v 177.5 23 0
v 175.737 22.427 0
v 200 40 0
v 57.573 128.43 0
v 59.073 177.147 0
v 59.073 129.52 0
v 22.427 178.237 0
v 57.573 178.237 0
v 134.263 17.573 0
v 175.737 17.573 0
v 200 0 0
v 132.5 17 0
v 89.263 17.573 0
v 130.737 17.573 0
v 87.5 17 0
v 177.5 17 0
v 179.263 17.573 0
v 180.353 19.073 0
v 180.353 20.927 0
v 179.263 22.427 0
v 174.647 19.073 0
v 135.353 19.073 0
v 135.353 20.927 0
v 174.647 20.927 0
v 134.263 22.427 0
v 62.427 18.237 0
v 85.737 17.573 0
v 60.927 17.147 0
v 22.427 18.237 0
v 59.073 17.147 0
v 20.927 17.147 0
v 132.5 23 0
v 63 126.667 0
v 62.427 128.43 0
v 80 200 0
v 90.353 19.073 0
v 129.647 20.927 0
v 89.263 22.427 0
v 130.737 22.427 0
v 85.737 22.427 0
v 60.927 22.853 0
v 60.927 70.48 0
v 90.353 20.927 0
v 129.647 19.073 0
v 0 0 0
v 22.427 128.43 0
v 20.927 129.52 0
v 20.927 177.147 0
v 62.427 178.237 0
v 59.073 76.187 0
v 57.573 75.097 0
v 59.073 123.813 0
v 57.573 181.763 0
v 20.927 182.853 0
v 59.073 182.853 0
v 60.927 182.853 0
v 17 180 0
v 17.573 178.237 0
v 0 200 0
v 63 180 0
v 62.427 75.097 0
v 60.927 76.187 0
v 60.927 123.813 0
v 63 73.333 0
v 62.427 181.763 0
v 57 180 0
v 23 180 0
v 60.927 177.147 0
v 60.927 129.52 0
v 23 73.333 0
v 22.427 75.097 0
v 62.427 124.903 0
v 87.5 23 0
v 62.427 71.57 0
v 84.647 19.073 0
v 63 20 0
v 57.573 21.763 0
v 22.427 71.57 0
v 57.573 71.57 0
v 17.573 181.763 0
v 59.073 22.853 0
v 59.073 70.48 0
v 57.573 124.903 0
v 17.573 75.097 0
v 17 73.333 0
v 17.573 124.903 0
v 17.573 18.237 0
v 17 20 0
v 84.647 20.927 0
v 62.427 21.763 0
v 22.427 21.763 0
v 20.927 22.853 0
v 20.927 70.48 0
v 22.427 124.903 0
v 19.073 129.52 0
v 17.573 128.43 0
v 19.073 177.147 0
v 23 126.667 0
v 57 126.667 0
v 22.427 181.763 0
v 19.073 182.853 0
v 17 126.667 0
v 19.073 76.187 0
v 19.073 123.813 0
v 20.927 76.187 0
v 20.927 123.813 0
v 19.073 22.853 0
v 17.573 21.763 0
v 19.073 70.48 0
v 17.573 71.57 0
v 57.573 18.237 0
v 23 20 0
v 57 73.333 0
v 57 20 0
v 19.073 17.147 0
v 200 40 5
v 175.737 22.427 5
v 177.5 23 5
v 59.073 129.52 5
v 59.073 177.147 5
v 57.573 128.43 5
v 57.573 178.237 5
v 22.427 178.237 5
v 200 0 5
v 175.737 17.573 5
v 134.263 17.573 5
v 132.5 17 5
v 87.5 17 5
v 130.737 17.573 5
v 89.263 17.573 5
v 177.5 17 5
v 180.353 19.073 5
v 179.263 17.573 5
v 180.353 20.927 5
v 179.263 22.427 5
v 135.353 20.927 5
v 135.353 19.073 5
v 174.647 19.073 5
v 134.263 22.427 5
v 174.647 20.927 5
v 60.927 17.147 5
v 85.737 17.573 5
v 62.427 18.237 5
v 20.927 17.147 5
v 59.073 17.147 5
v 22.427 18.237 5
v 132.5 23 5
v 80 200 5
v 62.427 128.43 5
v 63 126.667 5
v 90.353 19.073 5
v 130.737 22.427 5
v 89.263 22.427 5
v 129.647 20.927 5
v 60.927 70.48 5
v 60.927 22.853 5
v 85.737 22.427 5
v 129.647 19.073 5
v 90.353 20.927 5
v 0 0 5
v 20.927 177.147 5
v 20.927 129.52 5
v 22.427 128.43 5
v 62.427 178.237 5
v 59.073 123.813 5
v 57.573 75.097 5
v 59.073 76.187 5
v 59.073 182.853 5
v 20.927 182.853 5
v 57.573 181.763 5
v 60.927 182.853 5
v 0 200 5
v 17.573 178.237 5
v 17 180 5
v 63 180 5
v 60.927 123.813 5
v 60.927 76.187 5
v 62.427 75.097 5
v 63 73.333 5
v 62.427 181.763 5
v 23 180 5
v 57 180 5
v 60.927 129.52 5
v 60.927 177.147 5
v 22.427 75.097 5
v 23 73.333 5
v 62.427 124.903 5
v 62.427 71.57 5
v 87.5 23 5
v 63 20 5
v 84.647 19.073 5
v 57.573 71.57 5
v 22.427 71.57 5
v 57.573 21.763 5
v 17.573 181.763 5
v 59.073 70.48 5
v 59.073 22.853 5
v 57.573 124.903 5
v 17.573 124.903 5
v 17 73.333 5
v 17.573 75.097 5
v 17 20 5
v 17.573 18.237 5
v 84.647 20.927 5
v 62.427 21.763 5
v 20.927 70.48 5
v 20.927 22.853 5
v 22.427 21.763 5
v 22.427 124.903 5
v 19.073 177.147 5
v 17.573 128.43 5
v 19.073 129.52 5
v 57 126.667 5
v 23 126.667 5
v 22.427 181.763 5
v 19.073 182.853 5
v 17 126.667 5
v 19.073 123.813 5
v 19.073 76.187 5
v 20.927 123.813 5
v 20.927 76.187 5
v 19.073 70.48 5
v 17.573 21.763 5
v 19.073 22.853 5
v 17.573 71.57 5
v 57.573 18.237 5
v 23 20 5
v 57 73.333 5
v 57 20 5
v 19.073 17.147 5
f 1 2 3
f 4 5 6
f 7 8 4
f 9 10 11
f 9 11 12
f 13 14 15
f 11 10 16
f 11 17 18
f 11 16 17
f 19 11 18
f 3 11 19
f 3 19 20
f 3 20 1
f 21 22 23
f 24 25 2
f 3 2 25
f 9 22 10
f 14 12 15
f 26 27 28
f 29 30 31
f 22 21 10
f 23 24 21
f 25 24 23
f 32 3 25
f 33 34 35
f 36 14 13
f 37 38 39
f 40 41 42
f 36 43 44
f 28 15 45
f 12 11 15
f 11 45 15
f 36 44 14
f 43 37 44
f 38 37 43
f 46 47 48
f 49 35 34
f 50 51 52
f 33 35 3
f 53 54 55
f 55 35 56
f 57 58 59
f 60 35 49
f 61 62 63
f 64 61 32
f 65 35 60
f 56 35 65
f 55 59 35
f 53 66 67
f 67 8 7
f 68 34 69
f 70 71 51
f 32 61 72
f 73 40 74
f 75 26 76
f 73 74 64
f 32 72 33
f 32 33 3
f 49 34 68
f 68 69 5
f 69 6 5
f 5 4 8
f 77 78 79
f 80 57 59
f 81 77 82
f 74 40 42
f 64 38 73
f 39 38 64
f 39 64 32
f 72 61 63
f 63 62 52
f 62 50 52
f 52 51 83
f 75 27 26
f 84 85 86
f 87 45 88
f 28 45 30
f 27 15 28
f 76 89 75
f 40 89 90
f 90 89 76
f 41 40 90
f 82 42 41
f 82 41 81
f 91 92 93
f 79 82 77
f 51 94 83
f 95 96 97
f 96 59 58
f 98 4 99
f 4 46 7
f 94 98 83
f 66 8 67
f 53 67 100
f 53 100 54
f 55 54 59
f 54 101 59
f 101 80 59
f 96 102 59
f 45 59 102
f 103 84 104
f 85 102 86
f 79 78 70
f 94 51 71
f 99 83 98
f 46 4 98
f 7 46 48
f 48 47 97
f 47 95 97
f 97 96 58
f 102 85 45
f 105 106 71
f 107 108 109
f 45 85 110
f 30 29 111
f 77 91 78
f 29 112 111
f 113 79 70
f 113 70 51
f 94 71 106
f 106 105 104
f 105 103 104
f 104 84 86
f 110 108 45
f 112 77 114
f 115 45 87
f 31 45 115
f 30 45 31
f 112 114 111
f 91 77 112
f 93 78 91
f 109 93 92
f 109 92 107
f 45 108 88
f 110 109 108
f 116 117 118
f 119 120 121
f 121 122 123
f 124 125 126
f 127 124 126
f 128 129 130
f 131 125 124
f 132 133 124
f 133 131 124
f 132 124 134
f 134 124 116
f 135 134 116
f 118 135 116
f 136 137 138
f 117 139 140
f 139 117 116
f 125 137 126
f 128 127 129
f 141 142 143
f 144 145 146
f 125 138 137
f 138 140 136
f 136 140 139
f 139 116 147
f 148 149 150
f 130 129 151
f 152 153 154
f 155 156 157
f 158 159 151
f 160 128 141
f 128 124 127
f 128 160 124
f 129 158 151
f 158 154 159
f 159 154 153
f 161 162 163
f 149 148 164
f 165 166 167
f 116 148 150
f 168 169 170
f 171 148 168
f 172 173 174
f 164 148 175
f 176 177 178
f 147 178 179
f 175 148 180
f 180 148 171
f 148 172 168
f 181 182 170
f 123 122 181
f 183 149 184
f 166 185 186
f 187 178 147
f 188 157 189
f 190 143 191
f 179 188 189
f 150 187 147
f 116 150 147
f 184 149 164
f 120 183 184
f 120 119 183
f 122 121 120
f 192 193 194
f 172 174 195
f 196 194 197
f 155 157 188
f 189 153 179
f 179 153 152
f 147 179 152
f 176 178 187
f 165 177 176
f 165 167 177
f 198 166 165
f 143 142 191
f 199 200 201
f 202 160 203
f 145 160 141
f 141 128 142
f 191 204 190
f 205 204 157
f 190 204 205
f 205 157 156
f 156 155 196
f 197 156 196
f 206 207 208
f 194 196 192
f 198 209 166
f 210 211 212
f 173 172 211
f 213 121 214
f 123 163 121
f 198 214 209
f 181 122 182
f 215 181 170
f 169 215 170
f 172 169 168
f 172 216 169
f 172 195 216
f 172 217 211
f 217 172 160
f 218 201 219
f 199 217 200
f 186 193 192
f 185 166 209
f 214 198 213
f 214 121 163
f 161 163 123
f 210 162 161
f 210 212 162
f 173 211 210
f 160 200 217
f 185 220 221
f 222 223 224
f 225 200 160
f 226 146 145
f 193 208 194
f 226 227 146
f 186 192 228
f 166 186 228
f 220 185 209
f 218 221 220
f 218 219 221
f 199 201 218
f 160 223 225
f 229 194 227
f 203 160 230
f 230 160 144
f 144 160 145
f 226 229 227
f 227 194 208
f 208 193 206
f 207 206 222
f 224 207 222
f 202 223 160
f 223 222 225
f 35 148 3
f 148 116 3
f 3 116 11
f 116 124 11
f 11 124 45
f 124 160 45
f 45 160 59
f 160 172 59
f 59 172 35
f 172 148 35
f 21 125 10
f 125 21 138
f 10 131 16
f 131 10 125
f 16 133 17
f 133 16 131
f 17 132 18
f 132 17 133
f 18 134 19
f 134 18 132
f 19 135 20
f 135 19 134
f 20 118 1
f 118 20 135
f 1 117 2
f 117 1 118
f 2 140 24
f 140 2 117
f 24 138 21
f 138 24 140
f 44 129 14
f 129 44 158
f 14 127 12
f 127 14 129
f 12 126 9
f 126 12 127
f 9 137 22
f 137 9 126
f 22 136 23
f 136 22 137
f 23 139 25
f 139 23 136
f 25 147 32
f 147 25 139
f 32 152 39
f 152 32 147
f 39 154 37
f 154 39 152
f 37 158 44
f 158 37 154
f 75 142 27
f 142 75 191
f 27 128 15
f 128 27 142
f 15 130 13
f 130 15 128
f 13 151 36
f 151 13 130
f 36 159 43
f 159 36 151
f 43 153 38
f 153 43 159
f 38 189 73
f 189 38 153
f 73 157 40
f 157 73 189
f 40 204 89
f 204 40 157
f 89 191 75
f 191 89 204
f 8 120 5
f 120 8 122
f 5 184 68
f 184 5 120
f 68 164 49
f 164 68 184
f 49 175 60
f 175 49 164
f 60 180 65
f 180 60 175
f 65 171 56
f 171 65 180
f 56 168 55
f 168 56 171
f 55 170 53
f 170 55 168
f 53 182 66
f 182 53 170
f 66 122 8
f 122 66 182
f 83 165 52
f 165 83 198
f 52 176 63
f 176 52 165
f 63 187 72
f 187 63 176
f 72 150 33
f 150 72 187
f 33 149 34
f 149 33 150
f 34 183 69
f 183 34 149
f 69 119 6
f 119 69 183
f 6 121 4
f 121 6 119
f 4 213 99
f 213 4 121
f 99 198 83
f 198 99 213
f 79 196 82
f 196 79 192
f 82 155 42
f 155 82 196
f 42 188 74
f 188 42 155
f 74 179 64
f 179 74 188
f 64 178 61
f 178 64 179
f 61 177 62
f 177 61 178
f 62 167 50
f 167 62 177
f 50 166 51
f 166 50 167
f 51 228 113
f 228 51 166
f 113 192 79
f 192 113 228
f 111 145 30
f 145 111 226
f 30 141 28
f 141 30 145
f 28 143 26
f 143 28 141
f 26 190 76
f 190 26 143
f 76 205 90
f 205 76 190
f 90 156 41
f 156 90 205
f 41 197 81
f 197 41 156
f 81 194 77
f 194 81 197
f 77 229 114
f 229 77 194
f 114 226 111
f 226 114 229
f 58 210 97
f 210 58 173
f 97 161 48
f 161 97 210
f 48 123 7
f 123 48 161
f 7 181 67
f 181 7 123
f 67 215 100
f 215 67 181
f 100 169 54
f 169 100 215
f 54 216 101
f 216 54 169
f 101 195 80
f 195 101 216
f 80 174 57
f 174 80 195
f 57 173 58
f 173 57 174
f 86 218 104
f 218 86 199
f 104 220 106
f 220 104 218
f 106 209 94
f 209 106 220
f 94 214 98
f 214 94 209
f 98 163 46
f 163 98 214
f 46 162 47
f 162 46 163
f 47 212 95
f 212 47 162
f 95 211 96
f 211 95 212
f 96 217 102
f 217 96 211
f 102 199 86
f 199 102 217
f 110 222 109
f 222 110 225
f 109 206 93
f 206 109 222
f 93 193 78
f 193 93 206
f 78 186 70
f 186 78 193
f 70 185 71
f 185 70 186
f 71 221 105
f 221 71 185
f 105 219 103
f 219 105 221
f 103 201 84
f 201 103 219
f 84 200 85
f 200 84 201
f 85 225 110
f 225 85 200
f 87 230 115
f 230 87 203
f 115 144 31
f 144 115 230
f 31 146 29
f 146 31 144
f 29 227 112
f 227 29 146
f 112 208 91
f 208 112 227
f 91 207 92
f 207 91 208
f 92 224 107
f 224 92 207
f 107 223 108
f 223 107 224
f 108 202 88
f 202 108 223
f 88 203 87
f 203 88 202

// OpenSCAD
// file: bracket.scad
module bracket(h, l, a, b) {
	linear_extrude(h) {
		difference() {
			polygon([[0,0], [l, 0], [l, a], [b, l], [0, l]]);
			children(0);
			rotate([0, 180, -90]) children(1);
		}
	}
}

module bracket_holes(width, length, offset_, diameter, holes, rows=1) {
	between_rows = (width)/(rows);
	between_holes = (length - offset_*2)/(holes);
	wcenter = (width-((rows-1)*between_rows))/2;
	lcenter = (length-((holes-1)*between_holes))/2;
	for (r = [0:rows-1]) {
		row = wcenter + r*between_rows;
		for (i = [0:holes-1]) {
			translate([row, lcenter + i*between_holes]) circle(r=diameter/2);
		}
	}
}
// file: bracket_4080.scad
use <bracket.scad>;

module bracket_4080(h=5, l=200) {
	bracket(h, l, 80, 40) {
		translate([0, 55, 0]) bracket_holes(40, l, 10, 6, 4);
		bracket_holes(80, l, -6.6666, 6, 4, 2);
	}
}

bracket_4080();
// main file
use <bracket_4080.scad>;

module bracket_8040(h=5) {
	rotate([0, 0, 90]) scale([1, -1, 1]) bracket_4080();
}

bracket_8040();
